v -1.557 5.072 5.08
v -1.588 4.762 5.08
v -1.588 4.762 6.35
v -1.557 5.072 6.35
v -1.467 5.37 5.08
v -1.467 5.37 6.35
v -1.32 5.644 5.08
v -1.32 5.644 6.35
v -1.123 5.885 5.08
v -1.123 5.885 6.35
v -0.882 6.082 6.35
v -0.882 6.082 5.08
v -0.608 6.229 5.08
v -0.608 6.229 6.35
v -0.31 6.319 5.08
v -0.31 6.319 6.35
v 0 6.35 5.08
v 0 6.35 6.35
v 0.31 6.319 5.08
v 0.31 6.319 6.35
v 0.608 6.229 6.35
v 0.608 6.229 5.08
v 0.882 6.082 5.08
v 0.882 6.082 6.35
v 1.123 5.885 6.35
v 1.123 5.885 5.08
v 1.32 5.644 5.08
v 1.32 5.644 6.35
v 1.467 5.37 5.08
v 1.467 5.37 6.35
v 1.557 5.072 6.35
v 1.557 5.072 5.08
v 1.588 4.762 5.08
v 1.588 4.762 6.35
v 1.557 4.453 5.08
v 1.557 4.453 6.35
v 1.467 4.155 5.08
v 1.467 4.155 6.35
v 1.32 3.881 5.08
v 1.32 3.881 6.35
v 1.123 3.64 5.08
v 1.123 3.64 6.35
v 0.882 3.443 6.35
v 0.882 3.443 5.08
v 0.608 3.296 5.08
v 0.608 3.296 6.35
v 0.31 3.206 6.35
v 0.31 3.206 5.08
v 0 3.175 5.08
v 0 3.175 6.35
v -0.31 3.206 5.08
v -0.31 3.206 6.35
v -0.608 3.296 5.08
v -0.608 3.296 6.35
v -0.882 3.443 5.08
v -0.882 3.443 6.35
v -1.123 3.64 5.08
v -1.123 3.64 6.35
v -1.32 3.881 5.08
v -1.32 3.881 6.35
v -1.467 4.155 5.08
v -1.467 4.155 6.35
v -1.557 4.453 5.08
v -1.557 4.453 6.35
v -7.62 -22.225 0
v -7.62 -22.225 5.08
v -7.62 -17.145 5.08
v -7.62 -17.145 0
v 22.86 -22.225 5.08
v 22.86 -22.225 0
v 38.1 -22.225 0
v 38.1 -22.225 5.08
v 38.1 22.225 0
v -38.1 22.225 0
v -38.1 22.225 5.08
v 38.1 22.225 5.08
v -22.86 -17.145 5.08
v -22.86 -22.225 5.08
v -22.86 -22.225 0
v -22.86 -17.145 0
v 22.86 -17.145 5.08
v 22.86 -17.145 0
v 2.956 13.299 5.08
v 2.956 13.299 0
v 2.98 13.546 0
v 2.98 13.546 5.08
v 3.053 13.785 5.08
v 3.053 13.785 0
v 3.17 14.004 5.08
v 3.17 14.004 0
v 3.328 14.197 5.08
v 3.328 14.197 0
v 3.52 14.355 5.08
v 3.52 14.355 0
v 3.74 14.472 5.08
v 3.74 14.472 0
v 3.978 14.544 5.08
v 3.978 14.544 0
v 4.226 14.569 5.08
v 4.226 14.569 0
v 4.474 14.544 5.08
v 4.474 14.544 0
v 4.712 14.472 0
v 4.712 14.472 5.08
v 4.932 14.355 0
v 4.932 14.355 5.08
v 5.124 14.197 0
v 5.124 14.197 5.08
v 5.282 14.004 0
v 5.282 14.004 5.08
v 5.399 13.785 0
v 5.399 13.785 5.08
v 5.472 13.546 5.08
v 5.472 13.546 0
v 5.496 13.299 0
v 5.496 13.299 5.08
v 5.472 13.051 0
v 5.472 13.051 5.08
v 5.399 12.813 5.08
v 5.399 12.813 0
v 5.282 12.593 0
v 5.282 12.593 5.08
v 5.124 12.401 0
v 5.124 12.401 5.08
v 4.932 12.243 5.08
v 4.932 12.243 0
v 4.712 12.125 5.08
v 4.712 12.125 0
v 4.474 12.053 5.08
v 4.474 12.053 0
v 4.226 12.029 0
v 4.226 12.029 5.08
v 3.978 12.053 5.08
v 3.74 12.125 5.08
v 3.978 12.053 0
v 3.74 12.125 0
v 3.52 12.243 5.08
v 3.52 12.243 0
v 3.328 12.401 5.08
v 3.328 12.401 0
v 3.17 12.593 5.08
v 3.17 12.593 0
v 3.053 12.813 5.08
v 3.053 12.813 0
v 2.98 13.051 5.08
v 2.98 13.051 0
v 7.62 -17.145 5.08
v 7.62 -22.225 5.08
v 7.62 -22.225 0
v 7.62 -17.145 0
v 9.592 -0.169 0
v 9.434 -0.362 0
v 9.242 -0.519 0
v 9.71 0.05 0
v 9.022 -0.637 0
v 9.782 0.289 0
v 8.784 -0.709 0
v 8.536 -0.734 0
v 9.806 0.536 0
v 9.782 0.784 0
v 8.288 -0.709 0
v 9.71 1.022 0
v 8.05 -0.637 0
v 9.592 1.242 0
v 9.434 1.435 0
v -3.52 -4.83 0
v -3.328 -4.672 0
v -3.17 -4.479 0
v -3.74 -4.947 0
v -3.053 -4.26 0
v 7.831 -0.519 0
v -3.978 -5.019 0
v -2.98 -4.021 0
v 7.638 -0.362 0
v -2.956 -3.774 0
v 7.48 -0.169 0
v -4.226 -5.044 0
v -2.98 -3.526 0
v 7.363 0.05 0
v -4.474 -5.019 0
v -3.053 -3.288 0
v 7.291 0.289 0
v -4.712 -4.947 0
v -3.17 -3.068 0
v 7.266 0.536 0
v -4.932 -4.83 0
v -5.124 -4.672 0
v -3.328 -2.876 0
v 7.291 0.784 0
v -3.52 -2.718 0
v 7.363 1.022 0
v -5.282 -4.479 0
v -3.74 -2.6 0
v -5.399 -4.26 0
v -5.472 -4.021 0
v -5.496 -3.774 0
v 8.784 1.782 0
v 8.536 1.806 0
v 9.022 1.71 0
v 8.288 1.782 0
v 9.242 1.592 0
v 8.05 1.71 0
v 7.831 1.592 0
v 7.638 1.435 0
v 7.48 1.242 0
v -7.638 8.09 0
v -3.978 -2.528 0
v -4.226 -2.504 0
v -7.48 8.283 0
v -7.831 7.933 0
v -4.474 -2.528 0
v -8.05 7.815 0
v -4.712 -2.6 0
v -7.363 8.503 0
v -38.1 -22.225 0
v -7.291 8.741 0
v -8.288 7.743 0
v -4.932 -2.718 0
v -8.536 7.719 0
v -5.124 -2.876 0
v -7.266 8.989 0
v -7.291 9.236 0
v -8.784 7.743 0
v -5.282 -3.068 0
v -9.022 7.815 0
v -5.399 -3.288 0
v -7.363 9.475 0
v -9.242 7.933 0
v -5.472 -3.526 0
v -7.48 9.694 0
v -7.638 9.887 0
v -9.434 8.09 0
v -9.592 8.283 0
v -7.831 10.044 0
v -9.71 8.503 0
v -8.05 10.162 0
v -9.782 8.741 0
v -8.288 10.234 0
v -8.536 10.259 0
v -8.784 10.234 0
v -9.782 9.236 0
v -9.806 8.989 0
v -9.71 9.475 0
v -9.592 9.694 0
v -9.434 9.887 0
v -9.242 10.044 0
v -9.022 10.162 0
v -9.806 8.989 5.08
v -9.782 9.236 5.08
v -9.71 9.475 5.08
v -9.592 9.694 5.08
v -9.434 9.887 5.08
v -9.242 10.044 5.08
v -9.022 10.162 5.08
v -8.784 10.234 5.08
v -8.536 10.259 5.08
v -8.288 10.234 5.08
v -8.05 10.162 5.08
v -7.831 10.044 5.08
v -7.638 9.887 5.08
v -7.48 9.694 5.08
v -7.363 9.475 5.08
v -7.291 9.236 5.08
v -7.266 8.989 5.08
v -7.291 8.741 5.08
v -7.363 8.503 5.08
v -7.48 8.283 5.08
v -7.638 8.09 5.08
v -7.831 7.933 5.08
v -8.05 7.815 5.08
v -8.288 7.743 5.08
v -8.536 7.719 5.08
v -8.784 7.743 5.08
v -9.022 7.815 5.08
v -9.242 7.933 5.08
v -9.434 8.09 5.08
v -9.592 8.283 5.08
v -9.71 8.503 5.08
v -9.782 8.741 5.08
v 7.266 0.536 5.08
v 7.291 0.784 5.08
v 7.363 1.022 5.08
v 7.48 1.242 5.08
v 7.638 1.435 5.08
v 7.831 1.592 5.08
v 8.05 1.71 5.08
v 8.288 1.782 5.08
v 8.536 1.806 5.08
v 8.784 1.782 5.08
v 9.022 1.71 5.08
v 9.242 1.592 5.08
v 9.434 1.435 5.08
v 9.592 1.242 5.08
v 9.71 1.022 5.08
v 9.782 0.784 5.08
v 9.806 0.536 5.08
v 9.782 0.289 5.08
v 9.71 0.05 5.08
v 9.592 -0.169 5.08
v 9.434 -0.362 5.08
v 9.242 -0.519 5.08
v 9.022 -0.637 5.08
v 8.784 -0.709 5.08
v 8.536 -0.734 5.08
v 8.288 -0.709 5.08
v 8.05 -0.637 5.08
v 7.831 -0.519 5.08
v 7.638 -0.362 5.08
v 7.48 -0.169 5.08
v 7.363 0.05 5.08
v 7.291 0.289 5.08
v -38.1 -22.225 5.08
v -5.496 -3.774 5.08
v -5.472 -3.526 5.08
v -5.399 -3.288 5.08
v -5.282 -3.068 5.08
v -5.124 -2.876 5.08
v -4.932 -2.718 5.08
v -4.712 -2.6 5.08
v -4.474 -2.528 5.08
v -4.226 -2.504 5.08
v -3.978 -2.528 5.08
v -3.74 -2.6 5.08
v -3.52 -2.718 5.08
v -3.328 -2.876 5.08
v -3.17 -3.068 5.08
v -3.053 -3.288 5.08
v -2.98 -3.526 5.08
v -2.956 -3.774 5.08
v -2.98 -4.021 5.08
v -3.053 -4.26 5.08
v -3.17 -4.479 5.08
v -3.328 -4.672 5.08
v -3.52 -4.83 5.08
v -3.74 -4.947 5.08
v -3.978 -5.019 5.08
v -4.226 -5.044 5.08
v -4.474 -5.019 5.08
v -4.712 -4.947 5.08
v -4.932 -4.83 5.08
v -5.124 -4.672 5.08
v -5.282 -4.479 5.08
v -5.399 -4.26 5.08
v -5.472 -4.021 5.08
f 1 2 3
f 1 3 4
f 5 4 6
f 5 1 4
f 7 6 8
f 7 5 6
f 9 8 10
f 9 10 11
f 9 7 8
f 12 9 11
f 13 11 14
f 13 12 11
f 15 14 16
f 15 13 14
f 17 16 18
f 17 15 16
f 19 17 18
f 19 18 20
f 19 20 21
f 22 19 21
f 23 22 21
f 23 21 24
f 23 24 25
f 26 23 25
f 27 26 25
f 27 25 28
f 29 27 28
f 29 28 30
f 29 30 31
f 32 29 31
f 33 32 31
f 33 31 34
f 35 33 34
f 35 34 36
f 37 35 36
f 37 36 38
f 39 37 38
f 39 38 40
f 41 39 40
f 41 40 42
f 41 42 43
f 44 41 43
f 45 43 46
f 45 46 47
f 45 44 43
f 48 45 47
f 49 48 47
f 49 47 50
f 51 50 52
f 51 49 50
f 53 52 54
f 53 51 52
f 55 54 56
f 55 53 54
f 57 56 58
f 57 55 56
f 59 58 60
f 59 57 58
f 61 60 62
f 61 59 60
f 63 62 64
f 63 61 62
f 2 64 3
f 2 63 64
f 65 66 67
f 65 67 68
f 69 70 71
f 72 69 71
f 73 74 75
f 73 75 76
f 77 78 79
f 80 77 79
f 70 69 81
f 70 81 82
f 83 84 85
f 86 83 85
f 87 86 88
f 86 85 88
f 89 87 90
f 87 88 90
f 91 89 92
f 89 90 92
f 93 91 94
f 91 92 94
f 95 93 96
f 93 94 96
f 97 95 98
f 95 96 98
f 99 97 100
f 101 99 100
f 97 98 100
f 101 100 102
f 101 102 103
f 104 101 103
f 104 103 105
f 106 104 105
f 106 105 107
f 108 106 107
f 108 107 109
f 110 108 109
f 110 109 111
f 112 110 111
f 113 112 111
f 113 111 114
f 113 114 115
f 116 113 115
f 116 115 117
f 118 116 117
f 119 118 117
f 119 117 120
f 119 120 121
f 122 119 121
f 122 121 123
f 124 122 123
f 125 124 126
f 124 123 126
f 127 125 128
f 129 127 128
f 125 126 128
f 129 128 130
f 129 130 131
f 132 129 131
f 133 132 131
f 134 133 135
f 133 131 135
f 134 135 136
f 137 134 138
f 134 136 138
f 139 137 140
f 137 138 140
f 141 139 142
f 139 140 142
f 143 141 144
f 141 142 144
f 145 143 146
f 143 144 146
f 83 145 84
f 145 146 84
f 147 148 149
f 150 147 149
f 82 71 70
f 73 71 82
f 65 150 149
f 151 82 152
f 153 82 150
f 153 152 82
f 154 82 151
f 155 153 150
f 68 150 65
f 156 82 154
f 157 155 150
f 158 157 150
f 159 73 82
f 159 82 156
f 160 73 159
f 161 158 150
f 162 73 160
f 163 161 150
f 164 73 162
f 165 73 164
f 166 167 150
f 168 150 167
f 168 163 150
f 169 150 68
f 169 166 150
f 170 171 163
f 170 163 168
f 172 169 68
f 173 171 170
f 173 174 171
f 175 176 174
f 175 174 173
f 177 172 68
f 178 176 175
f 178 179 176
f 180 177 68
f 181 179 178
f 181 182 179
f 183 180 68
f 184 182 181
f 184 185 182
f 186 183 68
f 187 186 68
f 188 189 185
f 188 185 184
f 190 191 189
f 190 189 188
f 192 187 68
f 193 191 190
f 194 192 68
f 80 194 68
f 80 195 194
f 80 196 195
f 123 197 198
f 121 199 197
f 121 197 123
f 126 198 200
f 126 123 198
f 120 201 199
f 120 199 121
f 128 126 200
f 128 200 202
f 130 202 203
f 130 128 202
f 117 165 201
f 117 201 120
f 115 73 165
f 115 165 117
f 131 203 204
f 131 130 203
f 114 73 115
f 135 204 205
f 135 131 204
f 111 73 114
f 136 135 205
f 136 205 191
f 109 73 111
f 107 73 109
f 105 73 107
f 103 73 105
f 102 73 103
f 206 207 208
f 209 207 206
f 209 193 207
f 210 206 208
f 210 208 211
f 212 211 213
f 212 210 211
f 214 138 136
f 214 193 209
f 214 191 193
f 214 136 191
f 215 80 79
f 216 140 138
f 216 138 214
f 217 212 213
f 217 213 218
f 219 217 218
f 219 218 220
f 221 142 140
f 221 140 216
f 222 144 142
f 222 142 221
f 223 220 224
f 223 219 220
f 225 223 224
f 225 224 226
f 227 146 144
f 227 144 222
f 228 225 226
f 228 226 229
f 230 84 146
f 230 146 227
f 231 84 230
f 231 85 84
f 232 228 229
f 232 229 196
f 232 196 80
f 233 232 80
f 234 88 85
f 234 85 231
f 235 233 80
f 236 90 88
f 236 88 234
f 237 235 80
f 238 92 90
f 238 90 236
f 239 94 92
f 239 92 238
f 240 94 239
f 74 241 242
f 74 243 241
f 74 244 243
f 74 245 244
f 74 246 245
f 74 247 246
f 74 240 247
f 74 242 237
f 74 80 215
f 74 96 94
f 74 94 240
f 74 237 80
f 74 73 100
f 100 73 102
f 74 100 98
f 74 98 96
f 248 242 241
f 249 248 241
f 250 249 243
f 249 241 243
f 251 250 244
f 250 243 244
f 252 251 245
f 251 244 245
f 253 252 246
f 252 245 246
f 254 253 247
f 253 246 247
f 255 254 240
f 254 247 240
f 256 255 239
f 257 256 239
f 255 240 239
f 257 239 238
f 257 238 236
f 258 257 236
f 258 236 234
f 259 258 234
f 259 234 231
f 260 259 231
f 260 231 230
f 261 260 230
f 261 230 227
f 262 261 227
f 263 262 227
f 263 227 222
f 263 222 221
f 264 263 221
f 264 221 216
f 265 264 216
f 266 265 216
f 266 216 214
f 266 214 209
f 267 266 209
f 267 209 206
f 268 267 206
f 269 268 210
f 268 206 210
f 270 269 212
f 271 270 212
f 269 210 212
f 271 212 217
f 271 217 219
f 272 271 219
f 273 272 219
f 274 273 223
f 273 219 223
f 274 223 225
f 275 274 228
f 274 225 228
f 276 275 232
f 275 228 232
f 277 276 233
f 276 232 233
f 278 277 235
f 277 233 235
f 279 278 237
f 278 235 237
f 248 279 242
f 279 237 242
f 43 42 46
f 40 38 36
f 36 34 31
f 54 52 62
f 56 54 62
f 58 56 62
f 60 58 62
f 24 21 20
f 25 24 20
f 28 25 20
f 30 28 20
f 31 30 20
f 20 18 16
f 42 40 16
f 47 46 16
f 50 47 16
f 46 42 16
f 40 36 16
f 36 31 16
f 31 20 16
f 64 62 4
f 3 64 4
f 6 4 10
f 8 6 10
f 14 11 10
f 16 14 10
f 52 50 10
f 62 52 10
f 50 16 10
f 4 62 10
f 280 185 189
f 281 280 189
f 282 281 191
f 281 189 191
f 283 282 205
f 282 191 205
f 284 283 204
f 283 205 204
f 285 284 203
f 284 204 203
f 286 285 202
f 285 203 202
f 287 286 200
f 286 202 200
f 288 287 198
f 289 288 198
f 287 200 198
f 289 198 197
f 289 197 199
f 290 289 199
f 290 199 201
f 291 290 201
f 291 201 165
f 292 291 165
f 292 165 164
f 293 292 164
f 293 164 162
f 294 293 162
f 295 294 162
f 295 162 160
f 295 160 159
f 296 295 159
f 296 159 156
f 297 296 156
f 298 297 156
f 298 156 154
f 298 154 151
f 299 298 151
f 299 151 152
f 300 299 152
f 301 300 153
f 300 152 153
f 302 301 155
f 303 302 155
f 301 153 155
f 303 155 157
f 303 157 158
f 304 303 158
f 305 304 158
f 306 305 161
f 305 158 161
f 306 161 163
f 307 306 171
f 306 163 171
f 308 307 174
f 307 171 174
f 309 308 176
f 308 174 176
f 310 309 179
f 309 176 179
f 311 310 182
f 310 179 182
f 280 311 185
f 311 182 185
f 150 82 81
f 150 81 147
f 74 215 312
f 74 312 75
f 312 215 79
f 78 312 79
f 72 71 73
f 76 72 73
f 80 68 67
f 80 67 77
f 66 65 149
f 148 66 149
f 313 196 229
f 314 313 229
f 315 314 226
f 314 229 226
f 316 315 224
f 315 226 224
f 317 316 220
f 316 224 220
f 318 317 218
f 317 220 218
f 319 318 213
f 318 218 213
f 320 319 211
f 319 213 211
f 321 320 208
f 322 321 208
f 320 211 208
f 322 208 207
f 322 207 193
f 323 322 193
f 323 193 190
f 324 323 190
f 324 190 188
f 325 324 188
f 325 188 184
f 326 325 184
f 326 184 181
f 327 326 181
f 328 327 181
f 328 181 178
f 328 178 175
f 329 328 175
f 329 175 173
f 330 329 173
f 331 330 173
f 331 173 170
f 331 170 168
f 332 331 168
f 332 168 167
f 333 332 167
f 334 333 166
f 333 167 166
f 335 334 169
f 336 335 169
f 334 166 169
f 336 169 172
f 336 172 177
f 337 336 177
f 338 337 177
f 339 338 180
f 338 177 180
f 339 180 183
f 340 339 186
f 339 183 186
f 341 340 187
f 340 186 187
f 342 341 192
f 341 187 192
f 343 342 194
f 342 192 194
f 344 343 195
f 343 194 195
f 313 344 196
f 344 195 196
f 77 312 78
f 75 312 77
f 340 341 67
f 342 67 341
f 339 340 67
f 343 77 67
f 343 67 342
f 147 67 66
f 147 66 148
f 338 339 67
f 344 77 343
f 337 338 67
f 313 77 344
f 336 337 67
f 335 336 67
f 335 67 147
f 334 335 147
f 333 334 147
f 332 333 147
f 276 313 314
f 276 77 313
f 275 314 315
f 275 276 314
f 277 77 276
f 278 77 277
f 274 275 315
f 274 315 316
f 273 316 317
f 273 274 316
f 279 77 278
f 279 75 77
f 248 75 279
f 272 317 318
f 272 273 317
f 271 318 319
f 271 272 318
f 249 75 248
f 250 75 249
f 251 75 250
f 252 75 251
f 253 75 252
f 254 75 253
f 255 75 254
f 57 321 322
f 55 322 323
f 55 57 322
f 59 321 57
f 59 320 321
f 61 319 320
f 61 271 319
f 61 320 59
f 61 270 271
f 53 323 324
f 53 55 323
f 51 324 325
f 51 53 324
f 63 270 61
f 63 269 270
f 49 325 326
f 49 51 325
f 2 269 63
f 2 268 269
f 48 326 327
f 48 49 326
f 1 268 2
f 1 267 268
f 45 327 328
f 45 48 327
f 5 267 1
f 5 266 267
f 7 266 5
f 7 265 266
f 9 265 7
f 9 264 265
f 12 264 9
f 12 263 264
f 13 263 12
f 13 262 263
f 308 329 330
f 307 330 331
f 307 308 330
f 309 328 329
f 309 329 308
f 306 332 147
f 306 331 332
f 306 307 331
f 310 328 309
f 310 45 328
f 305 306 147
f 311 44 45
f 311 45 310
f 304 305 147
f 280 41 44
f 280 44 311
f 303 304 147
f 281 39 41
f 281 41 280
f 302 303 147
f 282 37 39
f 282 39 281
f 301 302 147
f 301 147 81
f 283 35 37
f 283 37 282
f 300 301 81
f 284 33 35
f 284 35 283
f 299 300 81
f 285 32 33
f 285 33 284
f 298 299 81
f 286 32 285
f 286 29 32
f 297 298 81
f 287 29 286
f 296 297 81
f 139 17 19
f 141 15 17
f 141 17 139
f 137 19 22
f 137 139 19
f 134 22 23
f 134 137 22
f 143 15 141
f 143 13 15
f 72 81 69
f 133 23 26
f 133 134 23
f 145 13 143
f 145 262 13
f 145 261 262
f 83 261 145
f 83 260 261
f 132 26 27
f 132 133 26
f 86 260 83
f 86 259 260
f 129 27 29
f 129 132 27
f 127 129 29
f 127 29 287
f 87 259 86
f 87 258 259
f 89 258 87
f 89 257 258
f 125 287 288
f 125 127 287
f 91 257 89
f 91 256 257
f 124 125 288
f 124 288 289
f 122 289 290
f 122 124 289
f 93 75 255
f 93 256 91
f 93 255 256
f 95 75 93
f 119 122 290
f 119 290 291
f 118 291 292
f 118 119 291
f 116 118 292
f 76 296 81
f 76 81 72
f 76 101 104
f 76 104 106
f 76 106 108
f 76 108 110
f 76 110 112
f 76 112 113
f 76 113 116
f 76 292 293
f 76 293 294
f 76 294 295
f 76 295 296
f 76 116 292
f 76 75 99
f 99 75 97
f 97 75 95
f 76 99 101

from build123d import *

# Parameters (mm, degrees)
SKETCH1_W           = 76.2
SKETCH1_H           = 44.45
BOSS_EXTRUDE1_DEPTH = 5.08
SKETCH2_R           = 1.5875
BOSS_EXTRUDE6_DEPTH = 6.35
SKETCH3_R           = 1.27
CUT_EXTRUDE1_DEPTH  = 6.35
SKETCH4_W           = 15.24
SKETCH4_H           = 5.08
CUT_EXTRUDE2_DEPTH  = 5.08


with BuildPart() as part:
    # Sketch1 → Boss-Extrude1 (new body)
    with BuildSketch(Plane.XY):
        Rectangle(SKETCH1_W, SKETCH1_H)
    extrude(amount=BOSS_EXTRUDE1_DEPTH)

    # Sketch2 → Boss-Extrude6 (add)
    with BuildSketch(Plane(origin=(0, 0, 0), x_dir=(-1, 0, 0), z_dir=(0, 0, -1))):
        with Locations((0, 4.7625)):
            Circle(SKETCH2_R)
    extrude(amount=-BOSS_EXTRUDE6_DEPTH)

    # Sketch3 → Cut-Extrude1 (cut)
    with BuildSketch(Plane(origin=(0, 0, 0), x_dir=(-1, 0, 0), z_dir=(0, 0, -1))):
        with Locations((4.226013148, -3.773684035)):
            Circle(SKETCH3_R)
        with Locations((-8.536184035, 0.536486852)):
            Circle(SKETCH3_R)
        with Locations((-4.226013147, 13.298684035)):
            Circle(SKETCH3_R)
        with Locations((8.536184035, 8.988513147)):
            Circle(SKETCH3_R)
    extrude(amount=-CUT_EXTRUDE1_DEPTH, mode=Mode.SUBTRACT)

    # Sketch4 → Cut-Extrude2 (cut)
    with BuildSketch(Plane(origin=(0, -22.225, 0), x_dir=(-1, 0, 0), z_dir=(0, -1, 0))):
        with Locations((15.24, -2.54)):
            Rectangle(SKETCH4_W, SKETCH4_H)
        with Locations((-15.24, -2.54)):
            Rectangle(SKETCH4_W, SKETCH4_H)
    extrude(amount=-CUT_EXTRUDE2_DEPTH, mode=Mode.SUBTRACT)


solid = part.part
